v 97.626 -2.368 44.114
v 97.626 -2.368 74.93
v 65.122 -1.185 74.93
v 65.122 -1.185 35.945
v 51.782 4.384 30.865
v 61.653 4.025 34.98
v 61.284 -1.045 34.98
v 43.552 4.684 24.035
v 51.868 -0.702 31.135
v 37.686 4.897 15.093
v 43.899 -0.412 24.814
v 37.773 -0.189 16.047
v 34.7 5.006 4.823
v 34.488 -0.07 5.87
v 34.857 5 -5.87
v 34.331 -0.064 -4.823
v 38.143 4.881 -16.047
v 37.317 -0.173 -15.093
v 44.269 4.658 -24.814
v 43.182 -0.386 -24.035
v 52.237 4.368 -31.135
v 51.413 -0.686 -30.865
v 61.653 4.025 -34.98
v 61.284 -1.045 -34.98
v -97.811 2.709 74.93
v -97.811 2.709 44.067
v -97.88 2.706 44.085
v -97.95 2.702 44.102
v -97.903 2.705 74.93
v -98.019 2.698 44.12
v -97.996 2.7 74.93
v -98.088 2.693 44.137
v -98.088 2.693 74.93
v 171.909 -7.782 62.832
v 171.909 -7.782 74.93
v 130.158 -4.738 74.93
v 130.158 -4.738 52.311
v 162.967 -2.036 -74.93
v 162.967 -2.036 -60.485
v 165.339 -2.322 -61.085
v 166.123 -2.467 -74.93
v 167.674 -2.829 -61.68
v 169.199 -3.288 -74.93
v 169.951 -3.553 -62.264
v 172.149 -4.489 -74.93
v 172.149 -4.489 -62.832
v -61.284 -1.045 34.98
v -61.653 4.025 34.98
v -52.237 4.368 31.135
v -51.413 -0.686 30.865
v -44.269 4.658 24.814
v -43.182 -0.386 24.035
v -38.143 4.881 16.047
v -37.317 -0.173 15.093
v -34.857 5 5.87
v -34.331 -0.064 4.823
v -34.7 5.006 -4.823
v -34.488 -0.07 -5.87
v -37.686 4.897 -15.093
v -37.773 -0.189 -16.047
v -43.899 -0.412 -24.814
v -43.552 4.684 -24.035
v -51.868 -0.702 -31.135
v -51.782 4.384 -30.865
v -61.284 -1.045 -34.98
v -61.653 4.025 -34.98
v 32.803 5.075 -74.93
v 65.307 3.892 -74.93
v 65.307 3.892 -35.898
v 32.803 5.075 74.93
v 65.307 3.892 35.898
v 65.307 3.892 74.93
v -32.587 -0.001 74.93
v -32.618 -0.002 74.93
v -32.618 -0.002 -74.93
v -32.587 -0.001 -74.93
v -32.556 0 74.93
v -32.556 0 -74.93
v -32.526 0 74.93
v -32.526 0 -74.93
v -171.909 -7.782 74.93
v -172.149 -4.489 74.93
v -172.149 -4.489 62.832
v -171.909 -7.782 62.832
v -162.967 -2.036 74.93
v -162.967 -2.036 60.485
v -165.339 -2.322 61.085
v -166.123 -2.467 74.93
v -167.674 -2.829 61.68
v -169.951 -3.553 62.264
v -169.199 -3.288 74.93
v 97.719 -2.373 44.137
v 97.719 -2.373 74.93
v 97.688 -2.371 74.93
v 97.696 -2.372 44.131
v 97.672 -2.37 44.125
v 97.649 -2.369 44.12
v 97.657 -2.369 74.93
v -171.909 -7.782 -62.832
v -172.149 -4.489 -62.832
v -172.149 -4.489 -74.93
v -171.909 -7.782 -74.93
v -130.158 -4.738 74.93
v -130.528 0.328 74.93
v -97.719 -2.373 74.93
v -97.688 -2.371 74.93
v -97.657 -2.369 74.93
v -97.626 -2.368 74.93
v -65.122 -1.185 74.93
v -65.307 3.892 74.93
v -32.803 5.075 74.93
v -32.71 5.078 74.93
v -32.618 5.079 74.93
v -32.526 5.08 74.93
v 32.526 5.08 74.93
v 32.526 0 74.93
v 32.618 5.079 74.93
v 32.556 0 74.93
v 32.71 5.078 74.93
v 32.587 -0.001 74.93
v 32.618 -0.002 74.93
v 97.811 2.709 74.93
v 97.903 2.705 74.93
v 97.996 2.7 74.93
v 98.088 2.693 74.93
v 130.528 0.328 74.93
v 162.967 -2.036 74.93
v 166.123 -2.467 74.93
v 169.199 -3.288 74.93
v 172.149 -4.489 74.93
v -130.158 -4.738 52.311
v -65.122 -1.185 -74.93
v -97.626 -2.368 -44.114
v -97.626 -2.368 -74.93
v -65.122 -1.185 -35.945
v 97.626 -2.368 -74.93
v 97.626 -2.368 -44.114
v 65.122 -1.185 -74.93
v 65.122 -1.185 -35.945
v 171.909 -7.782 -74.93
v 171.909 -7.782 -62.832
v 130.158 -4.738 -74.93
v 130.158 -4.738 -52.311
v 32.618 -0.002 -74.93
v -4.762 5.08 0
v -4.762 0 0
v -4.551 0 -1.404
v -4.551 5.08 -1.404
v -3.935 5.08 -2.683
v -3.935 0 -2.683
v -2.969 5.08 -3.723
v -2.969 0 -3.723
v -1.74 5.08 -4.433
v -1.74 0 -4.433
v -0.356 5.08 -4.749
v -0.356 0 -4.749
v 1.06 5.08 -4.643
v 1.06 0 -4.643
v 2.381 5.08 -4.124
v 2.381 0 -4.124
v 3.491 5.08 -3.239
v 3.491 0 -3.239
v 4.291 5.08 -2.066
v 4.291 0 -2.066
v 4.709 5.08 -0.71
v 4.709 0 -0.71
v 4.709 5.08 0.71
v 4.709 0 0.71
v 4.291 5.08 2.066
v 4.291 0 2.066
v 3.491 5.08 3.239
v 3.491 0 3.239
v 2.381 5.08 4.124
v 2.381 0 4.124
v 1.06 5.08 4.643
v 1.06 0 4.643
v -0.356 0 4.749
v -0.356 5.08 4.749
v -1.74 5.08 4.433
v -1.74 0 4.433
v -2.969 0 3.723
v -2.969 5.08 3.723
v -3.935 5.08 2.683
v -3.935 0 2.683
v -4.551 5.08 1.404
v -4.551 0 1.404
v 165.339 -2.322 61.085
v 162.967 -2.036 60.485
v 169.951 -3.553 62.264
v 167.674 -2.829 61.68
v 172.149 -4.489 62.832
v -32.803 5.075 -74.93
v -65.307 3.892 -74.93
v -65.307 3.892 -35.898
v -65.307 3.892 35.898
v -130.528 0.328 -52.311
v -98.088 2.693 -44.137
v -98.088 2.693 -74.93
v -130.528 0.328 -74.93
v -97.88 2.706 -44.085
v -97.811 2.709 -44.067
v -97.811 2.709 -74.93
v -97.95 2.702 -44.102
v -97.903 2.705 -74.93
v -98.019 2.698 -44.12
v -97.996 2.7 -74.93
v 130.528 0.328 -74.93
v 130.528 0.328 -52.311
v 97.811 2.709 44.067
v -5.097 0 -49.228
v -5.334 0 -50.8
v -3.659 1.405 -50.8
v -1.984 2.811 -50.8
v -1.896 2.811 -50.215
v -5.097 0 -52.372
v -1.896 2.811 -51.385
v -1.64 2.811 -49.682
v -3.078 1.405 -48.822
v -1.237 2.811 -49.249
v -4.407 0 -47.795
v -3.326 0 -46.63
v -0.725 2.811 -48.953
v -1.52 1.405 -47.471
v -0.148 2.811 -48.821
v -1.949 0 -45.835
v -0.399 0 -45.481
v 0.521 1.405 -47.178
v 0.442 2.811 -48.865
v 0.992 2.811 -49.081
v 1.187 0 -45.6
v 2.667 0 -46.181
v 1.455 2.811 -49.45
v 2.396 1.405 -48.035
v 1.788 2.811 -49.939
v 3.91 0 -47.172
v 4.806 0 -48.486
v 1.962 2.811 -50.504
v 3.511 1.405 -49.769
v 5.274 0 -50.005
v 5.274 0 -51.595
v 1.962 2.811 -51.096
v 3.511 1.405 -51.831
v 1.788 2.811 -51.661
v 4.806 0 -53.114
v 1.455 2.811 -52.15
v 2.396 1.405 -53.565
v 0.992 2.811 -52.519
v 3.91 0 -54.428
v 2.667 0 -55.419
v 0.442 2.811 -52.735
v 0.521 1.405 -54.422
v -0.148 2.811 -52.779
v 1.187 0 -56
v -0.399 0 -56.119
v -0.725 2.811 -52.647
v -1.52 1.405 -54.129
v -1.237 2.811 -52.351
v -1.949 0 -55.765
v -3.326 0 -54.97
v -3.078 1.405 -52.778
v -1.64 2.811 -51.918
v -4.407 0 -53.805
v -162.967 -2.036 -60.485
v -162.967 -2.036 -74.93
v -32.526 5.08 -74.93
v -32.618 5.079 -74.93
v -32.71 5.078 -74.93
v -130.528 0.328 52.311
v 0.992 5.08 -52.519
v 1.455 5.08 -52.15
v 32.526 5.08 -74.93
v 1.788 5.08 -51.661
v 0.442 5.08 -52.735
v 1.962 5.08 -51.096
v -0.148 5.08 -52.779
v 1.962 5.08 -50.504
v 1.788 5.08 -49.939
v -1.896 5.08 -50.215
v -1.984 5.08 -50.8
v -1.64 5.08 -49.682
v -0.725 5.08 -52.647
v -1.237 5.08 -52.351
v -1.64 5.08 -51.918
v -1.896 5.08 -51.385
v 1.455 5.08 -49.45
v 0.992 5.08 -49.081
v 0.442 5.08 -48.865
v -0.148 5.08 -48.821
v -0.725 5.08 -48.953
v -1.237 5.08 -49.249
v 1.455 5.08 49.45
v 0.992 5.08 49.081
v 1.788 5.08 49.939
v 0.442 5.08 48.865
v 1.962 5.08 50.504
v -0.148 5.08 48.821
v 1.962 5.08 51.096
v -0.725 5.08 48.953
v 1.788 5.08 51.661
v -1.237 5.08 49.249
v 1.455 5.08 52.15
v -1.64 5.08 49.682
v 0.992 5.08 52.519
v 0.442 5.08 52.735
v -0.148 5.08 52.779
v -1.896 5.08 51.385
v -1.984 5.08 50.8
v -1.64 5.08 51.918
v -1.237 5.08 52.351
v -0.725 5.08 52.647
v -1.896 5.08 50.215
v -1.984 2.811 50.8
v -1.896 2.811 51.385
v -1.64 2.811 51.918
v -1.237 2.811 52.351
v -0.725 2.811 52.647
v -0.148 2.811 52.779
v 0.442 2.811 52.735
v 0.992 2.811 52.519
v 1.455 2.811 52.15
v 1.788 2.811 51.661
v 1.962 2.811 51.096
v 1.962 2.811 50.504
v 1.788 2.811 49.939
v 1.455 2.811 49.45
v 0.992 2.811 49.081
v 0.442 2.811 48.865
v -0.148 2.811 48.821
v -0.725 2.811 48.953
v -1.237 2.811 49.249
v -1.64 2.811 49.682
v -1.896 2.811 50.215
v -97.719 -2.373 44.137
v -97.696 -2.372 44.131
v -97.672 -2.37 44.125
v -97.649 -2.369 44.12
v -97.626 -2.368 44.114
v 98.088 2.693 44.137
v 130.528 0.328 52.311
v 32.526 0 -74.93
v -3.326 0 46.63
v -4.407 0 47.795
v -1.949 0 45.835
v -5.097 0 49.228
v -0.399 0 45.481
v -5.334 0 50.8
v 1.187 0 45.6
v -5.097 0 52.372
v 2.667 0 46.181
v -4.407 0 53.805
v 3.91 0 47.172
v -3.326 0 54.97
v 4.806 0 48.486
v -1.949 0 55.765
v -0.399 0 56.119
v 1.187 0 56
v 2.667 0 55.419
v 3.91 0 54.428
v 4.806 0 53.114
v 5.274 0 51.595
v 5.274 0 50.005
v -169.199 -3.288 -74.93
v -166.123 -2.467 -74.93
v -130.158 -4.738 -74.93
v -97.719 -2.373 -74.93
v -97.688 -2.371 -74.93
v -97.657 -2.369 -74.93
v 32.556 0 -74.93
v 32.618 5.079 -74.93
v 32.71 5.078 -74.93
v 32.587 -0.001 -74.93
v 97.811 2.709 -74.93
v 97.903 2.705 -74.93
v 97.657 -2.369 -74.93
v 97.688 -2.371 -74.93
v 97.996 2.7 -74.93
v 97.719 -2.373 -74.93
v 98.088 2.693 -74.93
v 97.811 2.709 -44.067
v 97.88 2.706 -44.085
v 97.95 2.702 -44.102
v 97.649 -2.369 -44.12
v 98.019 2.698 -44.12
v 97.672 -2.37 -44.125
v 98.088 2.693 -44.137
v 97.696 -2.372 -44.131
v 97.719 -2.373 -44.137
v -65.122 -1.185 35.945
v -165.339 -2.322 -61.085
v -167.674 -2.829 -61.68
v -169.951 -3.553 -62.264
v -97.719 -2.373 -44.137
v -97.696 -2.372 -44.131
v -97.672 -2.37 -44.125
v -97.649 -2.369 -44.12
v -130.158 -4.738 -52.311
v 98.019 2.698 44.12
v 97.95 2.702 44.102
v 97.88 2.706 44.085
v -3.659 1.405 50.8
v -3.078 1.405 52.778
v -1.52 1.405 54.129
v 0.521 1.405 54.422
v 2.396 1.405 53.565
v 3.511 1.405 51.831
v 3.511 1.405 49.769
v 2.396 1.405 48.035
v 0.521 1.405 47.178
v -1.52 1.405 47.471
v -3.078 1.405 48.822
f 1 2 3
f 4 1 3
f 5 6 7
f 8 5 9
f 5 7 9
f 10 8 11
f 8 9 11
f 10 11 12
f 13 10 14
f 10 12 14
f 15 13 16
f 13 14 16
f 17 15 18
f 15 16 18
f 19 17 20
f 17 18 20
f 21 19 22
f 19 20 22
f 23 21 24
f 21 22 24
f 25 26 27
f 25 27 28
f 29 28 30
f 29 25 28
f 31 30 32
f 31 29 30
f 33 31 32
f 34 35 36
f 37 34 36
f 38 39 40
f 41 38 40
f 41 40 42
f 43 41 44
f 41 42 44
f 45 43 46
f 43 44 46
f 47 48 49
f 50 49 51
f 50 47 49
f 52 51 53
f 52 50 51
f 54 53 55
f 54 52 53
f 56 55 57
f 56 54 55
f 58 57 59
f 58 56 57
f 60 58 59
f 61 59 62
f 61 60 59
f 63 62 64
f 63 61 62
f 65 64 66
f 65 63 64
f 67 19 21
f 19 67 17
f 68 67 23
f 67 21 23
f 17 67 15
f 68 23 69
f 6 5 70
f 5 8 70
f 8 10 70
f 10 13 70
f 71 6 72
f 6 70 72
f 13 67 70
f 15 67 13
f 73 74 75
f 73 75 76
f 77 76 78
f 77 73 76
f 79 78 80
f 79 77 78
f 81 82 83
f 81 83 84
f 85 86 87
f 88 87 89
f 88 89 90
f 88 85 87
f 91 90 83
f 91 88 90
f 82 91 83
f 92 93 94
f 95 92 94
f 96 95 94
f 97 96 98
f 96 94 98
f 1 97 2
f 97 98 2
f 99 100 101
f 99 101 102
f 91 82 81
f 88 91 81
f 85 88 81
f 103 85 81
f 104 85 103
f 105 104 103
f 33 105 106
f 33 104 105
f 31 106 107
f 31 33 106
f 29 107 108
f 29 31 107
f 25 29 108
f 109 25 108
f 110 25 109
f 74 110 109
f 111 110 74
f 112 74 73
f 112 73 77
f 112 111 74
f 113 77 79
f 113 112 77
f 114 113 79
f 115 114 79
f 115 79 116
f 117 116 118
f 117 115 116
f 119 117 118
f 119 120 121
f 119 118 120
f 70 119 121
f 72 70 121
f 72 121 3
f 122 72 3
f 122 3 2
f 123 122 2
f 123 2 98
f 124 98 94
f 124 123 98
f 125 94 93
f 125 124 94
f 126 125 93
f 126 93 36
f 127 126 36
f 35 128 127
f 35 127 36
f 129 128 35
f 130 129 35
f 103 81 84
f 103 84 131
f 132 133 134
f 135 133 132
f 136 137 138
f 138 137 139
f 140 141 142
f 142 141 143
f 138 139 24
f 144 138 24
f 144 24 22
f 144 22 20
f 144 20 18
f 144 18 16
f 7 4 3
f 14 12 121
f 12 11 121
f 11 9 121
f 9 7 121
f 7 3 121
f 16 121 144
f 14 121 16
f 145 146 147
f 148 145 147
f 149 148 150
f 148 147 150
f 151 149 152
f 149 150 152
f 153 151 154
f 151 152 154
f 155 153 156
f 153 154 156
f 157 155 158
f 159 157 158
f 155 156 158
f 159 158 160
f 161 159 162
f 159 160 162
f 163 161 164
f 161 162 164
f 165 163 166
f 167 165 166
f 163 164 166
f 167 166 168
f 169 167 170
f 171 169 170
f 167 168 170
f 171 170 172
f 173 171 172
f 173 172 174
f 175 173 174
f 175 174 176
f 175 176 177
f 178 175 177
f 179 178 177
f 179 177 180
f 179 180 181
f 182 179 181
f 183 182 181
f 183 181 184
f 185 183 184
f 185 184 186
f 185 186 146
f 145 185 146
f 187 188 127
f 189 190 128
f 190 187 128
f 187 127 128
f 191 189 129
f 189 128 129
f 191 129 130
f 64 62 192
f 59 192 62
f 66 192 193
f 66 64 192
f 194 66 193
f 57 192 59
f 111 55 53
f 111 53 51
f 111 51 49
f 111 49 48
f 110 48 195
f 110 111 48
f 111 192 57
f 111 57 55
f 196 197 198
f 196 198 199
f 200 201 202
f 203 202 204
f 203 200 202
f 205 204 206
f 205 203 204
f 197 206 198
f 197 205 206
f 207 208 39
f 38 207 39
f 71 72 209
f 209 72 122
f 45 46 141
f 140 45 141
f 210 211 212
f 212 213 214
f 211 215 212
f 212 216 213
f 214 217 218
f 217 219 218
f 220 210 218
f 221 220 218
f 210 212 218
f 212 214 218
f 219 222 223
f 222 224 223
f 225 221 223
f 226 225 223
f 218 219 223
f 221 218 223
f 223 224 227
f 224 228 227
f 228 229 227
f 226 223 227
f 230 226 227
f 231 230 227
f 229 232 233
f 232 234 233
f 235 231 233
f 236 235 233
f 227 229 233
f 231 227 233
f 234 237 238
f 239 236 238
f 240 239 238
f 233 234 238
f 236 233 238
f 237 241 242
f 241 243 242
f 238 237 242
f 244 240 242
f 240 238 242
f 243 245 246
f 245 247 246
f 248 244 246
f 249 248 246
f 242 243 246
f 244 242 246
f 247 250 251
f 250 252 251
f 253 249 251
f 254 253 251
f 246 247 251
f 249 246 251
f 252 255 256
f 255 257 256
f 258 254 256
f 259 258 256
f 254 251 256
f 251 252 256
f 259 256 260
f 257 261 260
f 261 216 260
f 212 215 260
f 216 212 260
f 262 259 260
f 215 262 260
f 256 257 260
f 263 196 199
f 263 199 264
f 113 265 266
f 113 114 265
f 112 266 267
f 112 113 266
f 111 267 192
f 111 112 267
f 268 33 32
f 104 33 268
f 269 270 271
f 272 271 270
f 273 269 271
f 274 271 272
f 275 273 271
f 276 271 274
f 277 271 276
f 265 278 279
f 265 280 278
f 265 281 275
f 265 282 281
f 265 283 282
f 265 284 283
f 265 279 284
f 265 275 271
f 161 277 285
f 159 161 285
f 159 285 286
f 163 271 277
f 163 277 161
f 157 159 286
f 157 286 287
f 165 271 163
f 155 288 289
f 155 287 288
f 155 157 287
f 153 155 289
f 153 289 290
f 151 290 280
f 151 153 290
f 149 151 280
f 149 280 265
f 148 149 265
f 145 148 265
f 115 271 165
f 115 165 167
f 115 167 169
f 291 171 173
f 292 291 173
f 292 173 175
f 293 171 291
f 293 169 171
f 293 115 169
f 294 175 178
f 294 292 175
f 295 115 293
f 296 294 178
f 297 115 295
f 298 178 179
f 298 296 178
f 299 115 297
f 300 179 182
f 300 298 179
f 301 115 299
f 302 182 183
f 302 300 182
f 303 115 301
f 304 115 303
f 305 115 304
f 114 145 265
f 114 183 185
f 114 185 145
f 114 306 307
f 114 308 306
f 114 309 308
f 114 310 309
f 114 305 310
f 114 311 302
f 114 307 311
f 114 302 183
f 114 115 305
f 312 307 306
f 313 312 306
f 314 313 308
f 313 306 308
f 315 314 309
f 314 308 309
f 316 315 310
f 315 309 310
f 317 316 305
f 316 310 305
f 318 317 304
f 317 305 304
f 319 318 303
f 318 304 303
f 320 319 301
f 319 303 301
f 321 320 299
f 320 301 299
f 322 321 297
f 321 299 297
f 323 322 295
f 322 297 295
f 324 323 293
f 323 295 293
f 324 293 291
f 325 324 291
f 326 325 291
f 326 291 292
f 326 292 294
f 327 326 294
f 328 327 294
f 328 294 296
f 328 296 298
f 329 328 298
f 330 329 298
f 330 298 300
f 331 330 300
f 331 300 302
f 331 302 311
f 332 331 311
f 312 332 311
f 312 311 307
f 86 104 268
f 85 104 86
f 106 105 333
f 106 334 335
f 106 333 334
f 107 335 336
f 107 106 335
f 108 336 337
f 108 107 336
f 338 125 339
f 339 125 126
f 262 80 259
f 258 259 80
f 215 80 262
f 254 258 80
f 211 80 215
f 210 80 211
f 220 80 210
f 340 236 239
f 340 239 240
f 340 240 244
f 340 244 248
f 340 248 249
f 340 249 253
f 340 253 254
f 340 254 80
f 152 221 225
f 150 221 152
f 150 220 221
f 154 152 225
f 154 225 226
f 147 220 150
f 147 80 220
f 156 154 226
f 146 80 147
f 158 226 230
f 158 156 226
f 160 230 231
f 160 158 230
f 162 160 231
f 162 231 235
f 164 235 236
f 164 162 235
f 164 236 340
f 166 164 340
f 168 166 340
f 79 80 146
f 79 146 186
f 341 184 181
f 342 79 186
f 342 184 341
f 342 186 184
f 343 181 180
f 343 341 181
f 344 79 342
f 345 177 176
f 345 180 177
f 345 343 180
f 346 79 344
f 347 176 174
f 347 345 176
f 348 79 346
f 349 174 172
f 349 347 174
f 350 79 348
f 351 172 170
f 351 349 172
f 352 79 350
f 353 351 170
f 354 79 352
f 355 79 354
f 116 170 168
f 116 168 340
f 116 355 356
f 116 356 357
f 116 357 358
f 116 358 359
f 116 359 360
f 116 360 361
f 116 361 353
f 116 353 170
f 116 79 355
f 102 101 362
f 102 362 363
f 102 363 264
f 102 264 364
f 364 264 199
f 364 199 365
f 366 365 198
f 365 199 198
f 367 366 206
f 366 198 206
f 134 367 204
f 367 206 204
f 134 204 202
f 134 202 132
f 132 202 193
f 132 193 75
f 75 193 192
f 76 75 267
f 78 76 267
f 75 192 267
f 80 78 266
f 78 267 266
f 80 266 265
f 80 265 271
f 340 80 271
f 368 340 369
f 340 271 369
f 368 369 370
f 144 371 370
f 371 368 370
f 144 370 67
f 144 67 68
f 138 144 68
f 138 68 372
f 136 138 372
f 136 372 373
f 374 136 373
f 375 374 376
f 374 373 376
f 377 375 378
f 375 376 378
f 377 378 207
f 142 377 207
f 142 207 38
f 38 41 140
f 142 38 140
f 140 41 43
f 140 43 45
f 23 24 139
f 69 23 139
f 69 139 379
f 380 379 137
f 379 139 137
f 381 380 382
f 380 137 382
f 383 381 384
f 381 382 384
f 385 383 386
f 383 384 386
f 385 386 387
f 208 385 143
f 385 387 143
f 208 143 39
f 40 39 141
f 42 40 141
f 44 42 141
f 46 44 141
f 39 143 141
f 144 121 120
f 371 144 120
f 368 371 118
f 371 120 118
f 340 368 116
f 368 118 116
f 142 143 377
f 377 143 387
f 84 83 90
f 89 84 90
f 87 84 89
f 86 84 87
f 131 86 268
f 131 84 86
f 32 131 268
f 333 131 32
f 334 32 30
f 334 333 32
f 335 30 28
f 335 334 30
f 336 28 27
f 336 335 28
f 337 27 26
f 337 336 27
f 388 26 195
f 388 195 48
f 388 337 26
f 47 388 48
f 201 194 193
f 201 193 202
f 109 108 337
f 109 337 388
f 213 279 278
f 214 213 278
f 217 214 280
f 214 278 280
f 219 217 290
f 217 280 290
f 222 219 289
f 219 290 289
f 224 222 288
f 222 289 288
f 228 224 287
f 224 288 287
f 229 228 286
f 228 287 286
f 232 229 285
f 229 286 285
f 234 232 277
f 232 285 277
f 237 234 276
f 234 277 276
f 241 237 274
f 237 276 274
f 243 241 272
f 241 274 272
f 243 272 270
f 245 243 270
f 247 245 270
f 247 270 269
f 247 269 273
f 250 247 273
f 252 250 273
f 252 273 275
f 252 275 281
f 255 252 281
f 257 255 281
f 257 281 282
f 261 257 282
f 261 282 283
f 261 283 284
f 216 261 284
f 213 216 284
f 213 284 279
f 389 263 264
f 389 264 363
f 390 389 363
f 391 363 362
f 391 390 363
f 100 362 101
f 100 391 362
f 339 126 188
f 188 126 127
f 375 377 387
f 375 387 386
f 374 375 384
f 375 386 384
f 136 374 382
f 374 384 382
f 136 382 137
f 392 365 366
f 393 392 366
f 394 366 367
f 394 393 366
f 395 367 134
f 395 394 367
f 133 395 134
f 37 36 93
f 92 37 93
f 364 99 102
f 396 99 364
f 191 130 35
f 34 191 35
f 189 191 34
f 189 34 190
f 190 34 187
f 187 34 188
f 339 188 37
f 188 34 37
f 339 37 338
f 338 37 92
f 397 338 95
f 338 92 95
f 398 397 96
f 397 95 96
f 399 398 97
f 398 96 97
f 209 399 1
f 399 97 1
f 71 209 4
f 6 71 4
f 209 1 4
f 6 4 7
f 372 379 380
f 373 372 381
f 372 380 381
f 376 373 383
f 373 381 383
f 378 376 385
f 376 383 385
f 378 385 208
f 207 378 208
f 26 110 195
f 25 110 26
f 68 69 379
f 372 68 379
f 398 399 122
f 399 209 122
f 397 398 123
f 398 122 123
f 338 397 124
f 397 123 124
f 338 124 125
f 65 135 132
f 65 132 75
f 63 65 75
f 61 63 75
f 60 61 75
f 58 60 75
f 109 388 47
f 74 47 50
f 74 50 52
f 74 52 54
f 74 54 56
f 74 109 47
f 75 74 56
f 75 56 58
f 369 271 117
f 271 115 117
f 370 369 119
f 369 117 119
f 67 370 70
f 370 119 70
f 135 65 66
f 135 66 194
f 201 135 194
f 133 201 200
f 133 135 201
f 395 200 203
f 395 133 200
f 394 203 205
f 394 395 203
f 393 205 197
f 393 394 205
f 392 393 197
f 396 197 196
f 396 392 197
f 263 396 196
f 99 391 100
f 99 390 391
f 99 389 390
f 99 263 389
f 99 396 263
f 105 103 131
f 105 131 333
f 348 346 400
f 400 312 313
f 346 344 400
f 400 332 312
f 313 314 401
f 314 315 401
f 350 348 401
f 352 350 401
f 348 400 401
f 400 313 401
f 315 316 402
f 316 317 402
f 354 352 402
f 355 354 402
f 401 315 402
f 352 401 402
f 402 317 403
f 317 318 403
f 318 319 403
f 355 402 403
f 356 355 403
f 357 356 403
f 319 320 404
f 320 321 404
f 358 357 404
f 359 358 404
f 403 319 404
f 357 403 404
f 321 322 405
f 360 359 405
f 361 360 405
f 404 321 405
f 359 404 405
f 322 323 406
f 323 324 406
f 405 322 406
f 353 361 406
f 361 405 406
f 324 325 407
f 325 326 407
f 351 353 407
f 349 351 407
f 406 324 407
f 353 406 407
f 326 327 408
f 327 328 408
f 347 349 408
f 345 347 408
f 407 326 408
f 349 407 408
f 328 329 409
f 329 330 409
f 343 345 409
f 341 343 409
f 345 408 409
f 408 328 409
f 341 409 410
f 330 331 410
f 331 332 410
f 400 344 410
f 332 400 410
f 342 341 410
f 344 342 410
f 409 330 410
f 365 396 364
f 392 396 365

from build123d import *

# Parameters (mm, degrees)
BOSS_EXTRUDE1_DEPTH                       = 74.93
CUT_EXTRUDE1_START                        = -13.499231569
CUT_EXTRUDE1_DEPTH                        = 27.344407223
F_5_32_0_15625_DIAMETER_HOLE1_D           = 3.96875
F_5_32_0_15625_DIAMETER_HOLE1_DEPTH       = 5.08
F_5_32_0_15625_DIAMETER_HOLE1_CSINK_D     = 10.668
F_5_32_0_15625_DIAMETER_HOLE1_CSINK_ANGLE = 100
F_3_8_0_375_DIAMETER_HOLE1_D              = 9.525
F_3_8_0_375_DIAMETER_HOLE1_DEPTH          = 5.08


with BuildPart() as part:
    # Sketch6 → Boss-Extrude1 (new body, symmetric)
    with BuildSketch(Plane.XY):
        with BuildLine():
            Line((0, 0), (0, 5.08))
            Line((0, 5.08), (32.525659605, 5.08))
            ThreePointArc((32.525659605, 5.08), (32.664283789, 5.07873896), (32.80286209, 5.074956256))
            Line((32.80286209, 5.074956256), (65.30699268, 3.891728742))
            Line((65.30699268, 3.891728742), (97.81112327, 2.708501229))
            ThreePointArc((97.81112327, 2.708501229), (97.949609823, 2.702198114), (98.087958789, 2.693376674))
            Line((98.087958789, 2.693376674), (130.527530834, 0.328488024))
            Line((130.527530834, 0.328488024), (162.967102879, -2.036400627))
            ThreePointArc((162.967102879, -2.036400627), (167.673823883, -2.829176028), (172.14912896, -4.488501164))
            Line((172.14912896, -4.488501164), (171.909045825, -7.781761568))
            Line((171.909045825, -7.781761568), (130.158172165, -4.738066444))
            Line((130.158172165, -4.738066444), (97.71860012, -2.373177794))
            ThreePointArc((97.71860012, -2.373177794), (97.672483798, -2.370237314), (97.626321614, -2.368136275))
            Line((97.626321614, -2.368136275), (65.122191024, -1.184908762))
            Line((65.122191024, -1.184908762), (32.618060434, -0.001681248))
            ThreePointArc((32.618060434, -0.001681248), (32.571867667, -0.000420347), (32.525659605, 0))
            Line((32.525659605, 0), (0, 0))
        make_face()
    boss_extrude1 = extrude(amount=BOSS_EXTRUDE1_DEPTH, both=True)

    # Sketch11 → Cut-Extrude1 (cut)
    with BuildSketch(Plane(origin=(0.344497228, 4.725525927, 0), x_dir=(0.997353242, -0.072708399, 0), z_dir=(0.072708399, 0.997353242, 0)).offset(CUT_EXTRUDE1_START)):
        with BuildLine():
            Line((172.019843553, 62.831668461), (172.019843553, -62.831668461))
            Line((172.019843553, -62.831668461), (61.19754378, -34.980240535))
            ThreePointArc((61.19754378, -34.980240535), (33.920641331, 0), (61.19754378, 34.980240535))
            Line((61.19754378, 34.980240535), (172.019843553, 62.831668461))
        make_face()
    cut_extrude1 = extrude(amount=CUT_EXTRUDE1_DEPTH, mode=Mode.SUBTRACT)

    # Mirror1: Boss-Extrude1, Cut-Extrude1 across plane
    add(boss_extrude1.mirror(Plane(origin=(0, 0, 0), x_dir=(0, 0, 1), z_dir=(1, 0, 0))))
    add(cut_extrude1.mirror(Plane(origin=(0, 0, 0), x_dir=(0, 0, 1), z_dir=(1, 0, 0))), mode=Mode.SUBTRACT)

    # 5/32 (0.15625) Diameter Hole1
    with Locations(Plane(origin=(-1.862802154, 0, 42.848601798), x_dir=(1, 0, 0), z_dir=(0, -1, 0))):
        with Locations((1.862802154, -93.648601798), (1.862802154, 7.951398202)):
            CounterSinkHole(F_5_32_0_15625_DIAMETER_HOLE1_D / 2, F_5_32_0_15625_DIAMETER_HOLE1_CSINK_D / 2, depth=F_5_32_0_15625_DIAMETER_HOLE1_DEPTH, counter_sink_angle=F_5_32_0_15625_DIAMETER_HOLE1_CSINK_ANGLE)

    # 3/8 (0.375) Diameter Hole1
    with Locations(Plane(origin=(0, 5.08, 0), x_dir=(1, 0, 0), z_dir=(0, 1, 0))):
        with Locations((0, 0)):
            Hole(F_3_8_0_375_DIAMETER_HOLE1_D / 2, depth=F_3_8_0_375_DIAMETER_HOLE1_DEPTH)


solid = part.part
